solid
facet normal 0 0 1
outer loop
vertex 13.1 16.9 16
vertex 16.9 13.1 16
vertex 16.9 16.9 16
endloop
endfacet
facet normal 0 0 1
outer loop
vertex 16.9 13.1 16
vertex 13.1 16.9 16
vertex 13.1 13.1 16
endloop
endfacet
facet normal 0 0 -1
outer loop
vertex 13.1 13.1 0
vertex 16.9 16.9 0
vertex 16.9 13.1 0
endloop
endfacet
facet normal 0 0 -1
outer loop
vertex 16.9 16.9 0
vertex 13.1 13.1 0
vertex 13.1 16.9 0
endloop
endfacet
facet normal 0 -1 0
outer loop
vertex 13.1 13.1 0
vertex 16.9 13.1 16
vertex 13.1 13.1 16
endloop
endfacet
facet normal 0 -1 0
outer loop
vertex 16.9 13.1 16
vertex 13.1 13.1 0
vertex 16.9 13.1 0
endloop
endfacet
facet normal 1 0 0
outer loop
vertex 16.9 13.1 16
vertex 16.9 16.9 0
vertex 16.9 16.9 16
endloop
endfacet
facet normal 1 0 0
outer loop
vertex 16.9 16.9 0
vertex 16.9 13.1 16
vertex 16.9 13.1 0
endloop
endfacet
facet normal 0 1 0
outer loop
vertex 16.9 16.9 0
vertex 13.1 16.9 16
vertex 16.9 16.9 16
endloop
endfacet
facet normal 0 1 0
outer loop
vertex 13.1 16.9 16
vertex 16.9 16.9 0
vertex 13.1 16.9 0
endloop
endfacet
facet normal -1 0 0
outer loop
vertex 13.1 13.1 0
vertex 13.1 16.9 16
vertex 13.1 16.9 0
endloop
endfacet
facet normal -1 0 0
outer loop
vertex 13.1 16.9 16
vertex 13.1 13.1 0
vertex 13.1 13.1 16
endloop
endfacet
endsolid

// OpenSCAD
$fn=85;

module lozisko(){
    difference(){
        cylinder(d=7, h=4,center=true);
        cube([4.0,4.0,15],center=true);
        
        }//diff
    }//module

module osa(){
    cube([3.8,3.8,16],center=true);
}//module
module pin(){
    union(){
        color(alpha=0.5)rotate([0,0,0])cylinder(d=3.3,h=5.25, center=true);
        translate([0,0,2.90])sphere(d=3.41);   
        }//union
}//module

module kolecko(){
    
    difference(){
        cylinder(d=30,h=4.5, center=true,$fn=150);
        union(){
            for(angle=[0:45:359]) { rotate([0,0,angle])translate([4+9.5,0,0])rotate([0,90,0])cylinder(d=3.5,h=3.0, center=true);}//for
            cube([4,4,10], center=true);
            }//union
        }//diff
    }//module
    
translate([15,15,8])osa();
//translate([15,-15,2])lozisko();
//translate([-15,-15,2])lozisko();
//translate([-15,15,3.5])pin();
//translate([0,0,4.5/2]) kolecko();
/*
difference(){
    kolecko();
    //cube(50, center=false);
}
    */
